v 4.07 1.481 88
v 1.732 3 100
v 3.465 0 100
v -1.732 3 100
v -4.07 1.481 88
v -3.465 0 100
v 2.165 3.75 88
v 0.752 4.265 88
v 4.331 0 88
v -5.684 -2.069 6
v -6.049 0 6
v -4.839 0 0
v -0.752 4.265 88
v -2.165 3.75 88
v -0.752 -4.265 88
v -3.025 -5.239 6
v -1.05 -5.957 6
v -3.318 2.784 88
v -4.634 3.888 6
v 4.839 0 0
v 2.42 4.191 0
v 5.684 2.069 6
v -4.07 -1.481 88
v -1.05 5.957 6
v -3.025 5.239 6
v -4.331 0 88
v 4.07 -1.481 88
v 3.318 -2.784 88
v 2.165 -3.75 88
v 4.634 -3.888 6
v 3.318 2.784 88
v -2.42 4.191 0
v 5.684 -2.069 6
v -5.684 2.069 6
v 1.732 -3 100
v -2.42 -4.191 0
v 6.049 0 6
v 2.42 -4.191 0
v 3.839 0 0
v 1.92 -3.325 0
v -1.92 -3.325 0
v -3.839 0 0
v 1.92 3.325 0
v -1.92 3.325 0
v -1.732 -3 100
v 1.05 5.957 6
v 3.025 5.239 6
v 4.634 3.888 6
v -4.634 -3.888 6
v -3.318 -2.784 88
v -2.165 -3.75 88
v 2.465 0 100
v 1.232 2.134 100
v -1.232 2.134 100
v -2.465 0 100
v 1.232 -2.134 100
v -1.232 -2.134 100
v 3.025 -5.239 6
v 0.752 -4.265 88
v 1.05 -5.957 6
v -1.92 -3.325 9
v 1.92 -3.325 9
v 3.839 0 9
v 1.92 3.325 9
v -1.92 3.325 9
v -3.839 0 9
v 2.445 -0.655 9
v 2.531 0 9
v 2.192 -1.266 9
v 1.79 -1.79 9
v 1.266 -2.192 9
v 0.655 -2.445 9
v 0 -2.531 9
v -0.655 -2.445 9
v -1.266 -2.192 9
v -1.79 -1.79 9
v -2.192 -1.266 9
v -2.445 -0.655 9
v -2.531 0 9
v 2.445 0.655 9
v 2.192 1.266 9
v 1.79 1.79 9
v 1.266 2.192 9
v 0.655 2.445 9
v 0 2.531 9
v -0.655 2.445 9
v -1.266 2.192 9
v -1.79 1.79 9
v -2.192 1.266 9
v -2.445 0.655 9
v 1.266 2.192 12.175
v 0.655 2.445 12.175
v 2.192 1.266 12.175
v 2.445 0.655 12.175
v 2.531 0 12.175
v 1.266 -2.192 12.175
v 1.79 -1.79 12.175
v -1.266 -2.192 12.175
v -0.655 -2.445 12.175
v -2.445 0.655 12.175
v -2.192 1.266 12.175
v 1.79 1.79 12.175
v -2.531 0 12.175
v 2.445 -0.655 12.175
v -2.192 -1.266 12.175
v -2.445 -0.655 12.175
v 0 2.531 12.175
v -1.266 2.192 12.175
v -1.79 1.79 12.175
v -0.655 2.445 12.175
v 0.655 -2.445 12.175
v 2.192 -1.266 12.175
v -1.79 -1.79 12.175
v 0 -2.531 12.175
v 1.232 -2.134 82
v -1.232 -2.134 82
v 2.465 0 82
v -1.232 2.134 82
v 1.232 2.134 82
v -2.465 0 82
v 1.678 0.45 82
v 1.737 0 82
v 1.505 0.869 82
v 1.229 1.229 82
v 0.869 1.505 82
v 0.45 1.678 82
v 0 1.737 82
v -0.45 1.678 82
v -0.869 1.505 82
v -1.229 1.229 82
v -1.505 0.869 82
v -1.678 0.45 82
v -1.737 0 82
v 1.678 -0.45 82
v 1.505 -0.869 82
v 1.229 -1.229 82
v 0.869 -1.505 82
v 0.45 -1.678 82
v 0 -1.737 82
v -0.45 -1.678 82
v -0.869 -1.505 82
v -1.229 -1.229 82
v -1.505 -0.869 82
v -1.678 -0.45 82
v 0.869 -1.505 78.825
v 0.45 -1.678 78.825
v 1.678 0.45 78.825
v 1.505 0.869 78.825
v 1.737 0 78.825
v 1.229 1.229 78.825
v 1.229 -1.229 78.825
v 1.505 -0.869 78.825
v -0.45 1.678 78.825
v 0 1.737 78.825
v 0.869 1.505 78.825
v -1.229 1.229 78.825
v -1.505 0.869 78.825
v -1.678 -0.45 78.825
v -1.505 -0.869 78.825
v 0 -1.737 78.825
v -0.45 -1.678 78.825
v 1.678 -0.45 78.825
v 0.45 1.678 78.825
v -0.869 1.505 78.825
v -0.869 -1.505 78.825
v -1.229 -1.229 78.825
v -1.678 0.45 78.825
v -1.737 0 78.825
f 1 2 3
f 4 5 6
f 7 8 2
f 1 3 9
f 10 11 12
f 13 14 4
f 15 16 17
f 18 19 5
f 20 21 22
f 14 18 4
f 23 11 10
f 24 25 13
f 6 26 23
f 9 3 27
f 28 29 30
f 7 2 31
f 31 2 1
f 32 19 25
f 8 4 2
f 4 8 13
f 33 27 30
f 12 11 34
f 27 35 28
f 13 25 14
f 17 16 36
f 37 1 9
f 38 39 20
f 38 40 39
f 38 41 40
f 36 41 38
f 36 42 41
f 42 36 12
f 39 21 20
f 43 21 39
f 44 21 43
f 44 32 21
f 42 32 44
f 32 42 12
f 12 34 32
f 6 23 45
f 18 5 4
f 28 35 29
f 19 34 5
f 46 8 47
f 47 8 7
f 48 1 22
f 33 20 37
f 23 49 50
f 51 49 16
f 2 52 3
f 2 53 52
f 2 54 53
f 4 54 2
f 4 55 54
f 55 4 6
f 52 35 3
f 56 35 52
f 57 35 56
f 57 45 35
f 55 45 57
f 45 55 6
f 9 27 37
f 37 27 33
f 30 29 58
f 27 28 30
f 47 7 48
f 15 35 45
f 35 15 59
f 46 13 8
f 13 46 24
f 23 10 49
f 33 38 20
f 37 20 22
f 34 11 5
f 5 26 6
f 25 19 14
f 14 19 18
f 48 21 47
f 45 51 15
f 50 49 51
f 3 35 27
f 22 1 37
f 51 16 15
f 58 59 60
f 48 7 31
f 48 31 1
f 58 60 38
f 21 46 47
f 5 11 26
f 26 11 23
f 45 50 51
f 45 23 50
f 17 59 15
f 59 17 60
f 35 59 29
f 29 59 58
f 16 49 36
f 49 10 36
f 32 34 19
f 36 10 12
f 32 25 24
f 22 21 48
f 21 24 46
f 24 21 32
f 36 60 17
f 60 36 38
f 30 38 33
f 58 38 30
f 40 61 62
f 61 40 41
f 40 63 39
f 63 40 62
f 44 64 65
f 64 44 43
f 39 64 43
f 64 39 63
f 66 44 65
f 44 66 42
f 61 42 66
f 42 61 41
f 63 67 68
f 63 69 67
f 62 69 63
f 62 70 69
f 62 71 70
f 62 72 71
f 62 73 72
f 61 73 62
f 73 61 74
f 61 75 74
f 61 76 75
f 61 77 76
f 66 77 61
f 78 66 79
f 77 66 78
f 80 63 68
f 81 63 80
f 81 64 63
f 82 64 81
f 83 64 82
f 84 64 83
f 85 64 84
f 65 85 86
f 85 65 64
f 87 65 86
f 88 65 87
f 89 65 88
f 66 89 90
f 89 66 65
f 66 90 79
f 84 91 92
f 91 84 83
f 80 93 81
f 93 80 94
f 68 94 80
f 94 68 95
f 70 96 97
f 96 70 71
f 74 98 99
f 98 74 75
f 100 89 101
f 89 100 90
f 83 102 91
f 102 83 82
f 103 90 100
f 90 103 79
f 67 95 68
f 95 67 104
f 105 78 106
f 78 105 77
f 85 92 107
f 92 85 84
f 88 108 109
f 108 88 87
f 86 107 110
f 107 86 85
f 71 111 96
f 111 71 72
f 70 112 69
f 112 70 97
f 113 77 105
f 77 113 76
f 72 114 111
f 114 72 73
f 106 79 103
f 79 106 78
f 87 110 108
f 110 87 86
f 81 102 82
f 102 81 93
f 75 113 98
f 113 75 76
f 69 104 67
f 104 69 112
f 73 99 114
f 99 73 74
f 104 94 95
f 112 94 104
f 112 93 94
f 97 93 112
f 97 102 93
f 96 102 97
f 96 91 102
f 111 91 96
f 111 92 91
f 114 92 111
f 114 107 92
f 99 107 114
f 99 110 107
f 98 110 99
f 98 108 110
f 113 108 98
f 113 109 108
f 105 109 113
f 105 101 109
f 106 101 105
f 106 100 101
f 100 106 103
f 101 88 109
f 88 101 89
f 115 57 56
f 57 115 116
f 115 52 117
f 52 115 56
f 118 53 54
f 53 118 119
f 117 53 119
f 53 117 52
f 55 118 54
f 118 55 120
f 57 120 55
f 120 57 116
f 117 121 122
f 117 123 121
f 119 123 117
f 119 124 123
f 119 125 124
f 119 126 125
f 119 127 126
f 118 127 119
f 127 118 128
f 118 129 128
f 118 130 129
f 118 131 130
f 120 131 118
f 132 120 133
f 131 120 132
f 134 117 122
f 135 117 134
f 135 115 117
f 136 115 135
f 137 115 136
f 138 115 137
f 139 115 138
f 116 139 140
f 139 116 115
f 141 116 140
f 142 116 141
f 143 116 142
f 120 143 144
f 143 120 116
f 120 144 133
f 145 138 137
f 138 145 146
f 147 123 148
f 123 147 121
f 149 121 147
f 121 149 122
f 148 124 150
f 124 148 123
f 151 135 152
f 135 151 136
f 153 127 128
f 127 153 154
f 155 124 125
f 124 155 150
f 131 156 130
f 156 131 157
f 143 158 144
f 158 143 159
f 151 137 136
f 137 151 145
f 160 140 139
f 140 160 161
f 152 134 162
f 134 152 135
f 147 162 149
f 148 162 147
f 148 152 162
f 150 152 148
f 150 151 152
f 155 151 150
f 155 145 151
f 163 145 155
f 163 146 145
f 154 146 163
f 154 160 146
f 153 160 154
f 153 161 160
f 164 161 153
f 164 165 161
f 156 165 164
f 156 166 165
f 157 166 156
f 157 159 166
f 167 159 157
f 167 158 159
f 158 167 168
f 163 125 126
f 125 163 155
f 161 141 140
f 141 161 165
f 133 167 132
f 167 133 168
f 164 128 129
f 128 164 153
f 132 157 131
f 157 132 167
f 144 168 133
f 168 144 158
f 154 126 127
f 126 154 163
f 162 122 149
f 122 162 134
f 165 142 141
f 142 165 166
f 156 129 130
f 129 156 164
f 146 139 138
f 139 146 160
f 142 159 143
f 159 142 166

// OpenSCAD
/* [Handle] */

// (total tool length in mm)
length = 100;

// (minimum wall thickness in mm)
side_thickness = 1;

// (number of sides)
handle_sides = 18; //  [6:6:60]

// (multiplier of bit radius)
handle_thickness = 1.25;

// (wiggle room for the bits in mm)
tolerance = 0.3;

/* [Bit 1] */

// (in mm)
bit1_socket_diameter = 6.35;

// (in mm)
bit1_socket_depth = 9;

// (in mm)
bit1_magnet_diameter = 4.7625;

// (in mm)
bit1_magnet_depth = 3.175;

/* [Bit 2] */

// (in mm)
bit2_socket_diameter = 3.96875;

// (in mm)
bit2_socket_depth = 18;

// (in mm)
bit2_magnet_diameter = 3.175;

// (in mm)
bit2_magnet_depth = 3.175;

bit1_socket_radius = ( bit1_socket_diameter + tolerance ) / 2;
bit1_socket_height = bit1_socket_depth + bit1_magnet_depth;
bit1_inner_radius = bit1_socket_radius / cos( 180 / 6 );
bit1_external_radius = bit1_inner_radius + side_thickness;

bit2_socket_radius = ( bit2_socket_diameter + tolerance ) / 2;
bit2_socket_height = bit2_socket_depth + bit2_magnet_depth;
bit2_inner_radius = bit2_socket_radius / cos( 180 / 6 );
bit2_external_radius = bit2_inner_radius + side_thickness;

difference(){
    hull(){
        cylinder( h = length, r1 = bit1_external_radius, r2 = bit2_external_radius, $fn = 6 );
        translate( v = [ 0, 0, bit1_socket_depth / 1.5 ] ){
            cylinder( h = ( length - ( ( bit1_socket_depth + bit2_socket_depth ) / 1.5 ) ), r1 = bit1_external_radius * handle_thickness, r2 = bit2_external_radius * handle_thickness, $fn = handle_sides );
        }
    }        
	translate( v = [ 0, 0, -1 ] ){
        cylinder( h = bit1_socket_depth + 1, r = bit1_inner_radius, $fn = 6 );
	}
	translate( v = [ 0, 0, -1 ] ){
        cylinder( h = bit1_socket_depth + bit1_magnet_depth + 1, r = ( bit1_magnet_diameter + tolerance ) / 2, $fn = 24 );
	}
	translate( v = [ 0, 0, length - bit2_socket_depth ] ){
        cylinder( h = bit2_socket_depth + 1, r = bit2_inner_radius, $fn = 6 );
	}
	translate( v = [ 0, 0, length - ( bit2_socket_depth + bit2_magnet_depth ) ] ){
        cylinder( h = bit2_socket_depth + bit2_magnet_depth + 1, r = ( bit2_magnet_diameter + tolerance ) / 2, $fn = 24 );
	}
}
